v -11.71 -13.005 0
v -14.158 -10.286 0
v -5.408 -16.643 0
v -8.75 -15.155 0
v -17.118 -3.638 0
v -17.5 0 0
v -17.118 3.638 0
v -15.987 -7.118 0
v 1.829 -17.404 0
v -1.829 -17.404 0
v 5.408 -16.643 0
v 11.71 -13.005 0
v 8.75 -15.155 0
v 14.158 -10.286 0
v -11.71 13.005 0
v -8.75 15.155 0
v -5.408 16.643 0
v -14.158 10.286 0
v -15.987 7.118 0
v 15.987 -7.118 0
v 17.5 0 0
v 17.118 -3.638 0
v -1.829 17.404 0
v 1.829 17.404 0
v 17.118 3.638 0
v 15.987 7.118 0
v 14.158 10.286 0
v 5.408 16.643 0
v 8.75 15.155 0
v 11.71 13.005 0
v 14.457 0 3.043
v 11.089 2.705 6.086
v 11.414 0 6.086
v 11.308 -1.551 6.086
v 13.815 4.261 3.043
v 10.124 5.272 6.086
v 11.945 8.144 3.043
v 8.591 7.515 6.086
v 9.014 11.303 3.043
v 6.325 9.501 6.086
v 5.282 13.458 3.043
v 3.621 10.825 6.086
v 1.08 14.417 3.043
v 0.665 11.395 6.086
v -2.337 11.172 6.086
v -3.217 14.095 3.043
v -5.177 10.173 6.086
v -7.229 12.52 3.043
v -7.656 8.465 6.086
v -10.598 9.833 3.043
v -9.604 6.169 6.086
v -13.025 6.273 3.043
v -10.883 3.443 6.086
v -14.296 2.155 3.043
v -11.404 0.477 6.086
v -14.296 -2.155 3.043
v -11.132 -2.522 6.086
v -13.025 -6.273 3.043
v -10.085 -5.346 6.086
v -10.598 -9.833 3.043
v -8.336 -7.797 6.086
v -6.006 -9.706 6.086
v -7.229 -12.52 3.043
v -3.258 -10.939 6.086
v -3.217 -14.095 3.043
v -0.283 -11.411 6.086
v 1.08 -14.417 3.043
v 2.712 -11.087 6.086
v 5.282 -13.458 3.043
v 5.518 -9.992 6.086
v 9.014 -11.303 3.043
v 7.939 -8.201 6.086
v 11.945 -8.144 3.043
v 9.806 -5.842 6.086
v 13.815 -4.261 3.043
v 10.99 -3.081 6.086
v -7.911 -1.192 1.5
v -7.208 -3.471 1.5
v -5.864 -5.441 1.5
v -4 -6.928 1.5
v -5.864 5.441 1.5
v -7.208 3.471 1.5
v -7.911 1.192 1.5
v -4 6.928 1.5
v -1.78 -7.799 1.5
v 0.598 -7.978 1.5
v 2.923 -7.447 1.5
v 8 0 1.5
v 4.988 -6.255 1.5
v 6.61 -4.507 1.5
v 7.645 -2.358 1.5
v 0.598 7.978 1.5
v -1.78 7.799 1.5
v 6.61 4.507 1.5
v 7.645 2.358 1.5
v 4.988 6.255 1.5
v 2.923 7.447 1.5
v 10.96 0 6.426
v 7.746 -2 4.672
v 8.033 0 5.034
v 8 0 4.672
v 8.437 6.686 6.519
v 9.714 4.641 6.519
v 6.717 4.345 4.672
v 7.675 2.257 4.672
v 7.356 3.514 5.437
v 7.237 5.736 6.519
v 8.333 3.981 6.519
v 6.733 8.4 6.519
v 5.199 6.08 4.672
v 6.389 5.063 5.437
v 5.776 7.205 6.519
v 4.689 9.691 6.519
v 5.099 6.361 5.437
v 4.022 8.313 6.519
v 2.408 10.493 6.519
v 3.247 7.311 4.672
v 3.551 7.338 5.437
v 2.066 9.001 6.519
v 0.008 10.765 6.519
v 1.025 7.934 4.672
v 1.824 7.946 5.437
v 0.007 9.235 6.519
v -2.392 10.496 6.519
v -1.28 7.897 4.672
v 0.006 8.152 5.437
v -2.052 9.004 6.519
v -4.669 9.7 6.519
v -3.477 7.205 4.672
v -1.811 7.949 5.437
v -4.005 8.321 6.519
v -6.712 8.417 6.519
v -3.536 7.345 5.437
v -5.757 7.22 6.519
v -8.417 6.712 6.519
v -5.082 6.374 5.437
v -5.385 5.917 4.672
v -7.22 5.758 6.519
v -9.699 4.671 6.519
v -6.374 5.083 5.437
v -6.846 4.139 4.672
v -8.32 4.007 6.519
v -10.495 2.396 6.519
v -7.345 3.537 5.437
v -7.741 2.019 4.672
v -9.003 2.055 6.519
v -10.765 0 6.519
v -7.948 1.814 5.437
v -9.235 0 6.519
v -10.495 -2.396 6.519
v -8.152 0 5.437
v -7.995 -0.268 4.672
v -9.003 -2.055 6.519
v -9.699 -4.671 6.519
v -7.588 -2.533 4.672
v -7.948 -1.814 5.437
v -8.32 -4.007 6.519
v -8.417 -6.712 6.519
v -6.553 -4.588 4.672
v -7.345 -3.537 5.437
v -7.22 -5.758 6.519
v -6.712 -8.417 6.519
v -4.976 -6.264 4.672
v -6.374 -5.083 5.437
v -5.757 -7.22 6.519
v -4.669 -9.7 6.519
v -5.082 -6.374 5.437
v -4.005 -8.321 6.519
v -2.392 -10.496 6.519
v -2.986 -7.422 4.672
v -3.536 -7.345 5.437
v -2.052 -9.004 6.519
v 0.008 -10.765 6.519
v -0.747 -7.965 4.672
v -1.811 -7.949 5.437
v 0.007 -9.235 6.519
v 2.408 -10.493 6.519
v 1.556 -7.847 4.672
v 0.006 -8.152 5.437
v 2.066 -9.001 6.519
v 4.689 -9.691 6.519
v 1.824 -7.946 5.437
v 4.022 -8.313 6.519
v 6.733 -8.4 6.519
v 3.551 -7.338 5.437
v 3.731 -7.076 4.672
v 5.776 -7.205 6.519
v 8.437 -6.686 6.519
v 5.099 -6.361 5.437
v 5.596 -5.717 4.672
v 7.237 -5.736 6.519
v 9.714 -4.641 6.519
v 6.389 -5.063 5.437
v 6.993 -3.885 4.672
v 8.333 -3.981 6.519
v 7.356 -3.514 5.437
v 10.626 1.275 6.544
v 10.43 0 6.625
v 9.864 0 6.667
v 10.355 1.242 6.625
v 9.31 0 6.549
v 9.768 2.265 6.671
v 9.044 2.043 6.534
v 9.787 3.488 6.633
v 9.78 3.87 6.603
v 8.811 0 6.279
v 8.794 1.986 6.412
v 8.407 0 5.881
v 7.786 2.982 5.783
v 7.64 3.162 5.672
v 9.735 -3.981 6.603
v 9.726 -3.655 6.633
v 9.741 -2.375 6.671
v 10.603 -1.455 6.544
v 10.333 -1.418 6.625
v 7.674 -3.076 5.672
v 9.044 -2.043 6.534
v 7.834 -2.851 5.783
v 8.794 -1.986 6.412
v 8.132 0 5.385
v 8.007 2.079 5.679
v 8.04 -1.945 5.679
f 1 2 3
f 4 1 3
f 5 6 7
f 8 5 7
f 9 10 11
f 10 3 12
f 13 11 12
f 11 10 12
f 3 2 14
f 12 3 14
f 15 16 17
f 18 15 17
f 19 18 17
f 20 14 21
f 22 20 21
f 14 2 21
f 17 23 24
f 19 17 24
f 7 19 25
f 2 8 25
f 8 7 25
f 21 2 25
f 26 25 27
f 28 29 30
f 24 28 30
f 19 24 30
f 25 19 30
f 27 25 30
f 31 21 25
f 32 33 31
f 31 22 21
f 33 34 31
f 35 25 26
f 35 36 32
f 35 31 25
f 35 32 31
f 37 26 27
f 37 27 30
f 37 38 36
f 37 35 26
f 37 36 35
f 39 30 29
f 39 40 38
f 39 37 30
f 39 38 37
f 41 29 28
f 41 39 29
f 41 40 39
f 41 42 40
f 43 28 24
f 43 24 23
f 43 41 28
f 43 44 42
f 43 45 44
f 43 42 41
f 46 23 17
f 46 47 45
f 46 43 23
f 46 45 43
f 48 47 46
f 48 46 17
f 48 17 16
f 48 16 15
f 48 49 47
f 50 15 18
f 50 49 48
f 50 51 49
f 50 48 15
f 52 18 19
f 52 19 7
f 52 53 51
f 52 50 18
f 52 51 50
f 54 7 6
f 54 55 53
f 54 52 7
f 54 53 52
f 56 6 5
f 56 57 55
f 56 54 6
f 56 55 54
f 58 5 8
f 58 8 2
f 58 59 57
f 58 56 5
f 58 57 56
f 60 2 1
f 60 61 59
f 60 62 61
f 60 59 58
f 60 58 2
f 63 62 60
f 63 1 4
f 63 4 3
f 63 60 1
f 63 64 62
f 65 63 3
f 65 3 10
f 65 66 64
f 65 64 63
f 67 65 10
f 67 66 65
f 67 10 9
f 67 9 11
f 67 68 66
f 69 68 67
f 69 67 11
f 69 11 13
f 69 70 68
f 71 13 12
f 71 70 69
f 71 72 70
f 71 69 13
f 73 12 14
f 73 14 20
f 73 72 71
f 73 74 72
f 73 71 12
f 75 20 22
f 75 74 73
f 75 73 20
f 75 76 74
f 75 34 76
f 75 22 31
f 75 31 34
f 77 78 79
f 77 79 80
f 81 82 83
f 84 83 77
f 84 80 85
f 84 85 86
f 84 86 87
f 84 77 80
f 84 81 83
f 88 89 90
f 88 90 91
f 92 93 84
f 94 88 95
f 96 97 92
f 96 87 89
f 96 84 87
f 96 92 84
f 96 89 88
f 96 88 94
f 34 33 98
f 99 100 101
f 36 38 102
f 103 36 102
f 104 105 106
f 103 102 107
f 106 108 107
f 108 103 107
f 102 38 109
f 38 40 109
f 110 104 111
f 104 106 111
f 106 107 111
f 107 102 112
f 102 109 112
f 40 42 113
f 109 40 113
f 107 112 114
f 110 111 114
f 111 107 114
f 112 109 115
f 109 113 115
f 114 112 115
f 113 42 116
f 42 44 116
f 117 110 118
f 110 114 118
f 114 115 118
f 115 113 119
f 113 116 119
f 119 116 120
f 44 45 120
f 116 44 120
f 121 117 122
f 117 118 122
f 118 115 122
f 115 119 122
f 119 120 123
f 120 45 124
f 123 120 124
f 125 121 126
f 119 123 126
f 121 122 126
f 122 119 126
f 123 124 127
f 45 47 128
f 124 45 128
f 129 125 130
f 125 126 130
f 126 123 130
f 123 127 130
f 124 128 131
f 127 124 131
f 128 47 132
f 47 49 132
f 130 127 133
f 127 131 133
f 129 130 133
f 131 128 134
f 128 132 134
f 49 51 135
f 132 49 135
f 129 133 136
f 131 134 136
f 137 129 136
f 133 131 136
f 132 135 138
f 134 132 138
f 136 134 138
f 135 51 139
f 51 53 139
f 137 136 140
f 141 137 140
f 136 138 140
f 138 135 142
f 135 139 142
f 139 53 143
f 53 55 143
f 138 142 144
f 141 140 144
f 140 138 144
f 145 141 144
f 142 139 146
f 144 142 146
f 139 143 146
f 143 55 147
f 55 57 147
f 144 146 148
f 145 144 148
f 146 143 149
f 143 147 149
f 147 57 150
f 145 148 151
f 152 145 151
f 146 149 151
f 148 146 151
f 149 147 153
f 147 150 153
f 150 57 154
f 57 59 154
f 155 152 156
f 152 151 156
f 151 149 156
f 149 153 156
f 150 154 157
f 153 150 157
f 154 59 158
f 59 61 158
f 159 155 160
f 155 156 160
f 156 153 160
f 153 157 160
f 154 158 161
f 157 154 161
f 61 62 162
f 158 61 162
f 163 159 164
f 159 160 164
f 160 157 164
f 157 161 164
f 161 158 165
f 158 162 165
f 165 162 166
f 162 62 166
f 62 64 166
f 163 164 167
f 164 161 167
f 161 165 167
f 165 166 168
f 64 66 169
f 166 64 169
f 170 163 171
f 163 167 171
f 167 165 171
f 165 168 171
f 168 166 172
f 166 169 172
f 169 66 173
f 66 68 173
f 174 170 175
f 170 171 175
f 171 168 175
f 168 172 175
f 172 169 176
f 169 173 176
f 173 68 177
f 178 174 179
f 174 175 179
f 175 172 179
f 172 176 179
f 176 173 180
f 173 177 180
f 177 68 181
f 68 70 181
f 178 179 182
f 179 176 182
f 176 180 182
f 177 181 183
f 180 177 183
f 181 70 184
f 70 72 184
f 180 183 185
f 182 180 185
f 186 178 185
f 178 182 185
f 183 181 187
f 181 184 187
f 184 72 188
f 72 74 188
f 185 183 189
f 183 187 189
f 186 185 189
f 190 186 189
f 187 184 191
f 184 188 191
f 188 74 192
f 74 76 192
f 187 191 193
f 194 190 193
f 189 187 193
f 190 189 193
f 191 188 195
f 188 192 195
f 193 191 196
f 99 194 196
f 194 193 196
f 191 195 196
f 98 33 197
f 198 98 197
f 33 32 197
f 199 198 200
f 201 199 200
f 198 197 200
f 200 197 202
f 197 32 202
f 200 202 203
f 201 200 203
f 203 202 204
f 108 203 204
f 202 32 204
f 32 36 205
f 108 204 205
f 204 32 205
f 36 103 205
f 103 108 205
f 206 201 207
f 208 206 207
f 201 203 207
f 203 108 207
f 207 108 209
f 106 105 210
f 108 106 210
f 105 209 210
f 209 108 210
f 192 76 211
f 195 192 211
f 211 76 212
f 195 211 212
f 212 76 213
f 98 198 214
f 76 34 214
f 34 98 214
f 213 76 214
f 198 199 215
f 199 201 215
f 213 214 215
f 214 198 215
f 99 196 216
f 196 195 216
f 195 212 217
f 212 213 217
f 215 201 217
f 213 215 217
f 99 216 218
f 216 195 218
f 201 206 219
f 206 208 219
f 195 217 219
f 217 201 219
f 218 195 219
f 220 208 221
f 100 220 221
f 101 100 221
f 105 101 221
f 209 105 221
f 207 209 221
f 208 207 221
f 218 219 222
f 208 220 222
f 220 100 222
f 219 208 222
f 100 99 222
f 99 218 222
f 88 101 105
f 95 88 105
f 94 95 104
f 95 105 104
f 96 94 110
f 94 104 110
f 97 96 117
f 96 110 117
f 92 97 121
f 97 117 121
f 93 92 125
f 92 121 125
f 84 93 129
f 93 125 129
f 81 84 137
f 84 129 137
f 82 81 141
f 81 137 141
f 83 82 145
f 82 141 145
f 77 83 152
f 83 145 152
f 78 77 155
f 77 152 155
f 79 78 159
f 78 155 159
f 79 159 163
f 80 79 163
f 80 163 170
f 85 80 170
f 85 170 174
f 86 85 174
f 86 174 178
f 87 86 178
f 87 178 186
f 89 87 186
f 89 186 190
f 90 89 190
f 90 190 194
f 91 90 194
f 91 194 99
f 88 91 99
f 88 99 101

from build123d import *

# Parameters (mm, degrees)
F0_R     = 17.5
F1_DEPTH = 10
F2_R     = 8
F3_DEPTH = 8.5
F5_R     = 2


# Not quite as in the source:
# - a fillet or chamfer that OpenCascade refuses, or shapes differently, is made with other operations: its cross-section is extruded or revolved along the edge and cut away or added


with BuildPart() as f1:
    # F0 (on Top) → F1 (new body)
    with BuildSketch(Plane.XY):
        Circle(F0_R)
    extrude(amount=F1_DEPTH)

    # F2 (on face) → F3 (cut)
    with BuildSketch(Plane.XY.offset(10)):
        Circle(F2_R)
    extrude(amount=-F3_DEPTH, mode=Mode.SUBTRACT)

    # F4: chamfer of 10 on 1 edges, made by hand

    # F4_s1 → F4_t2 (revolve, cut)
    with BuildSketch(Plane.XZ):
        Polygon((17.5, 0), (7.5, 10), (17.5, 10), align=None)
    revolve(axis=Axis((0, 0, 10), (0, 0, 1)), mode=Mode.SUBTRACT)

    # F5
    f5_edges = [f1.edges().sort_by_distance(p)[0] for p in [
        (-8, 0, 9.5),
    ]]
    fillet(f5_edges, radius=F5_R)


solid = f1.part
